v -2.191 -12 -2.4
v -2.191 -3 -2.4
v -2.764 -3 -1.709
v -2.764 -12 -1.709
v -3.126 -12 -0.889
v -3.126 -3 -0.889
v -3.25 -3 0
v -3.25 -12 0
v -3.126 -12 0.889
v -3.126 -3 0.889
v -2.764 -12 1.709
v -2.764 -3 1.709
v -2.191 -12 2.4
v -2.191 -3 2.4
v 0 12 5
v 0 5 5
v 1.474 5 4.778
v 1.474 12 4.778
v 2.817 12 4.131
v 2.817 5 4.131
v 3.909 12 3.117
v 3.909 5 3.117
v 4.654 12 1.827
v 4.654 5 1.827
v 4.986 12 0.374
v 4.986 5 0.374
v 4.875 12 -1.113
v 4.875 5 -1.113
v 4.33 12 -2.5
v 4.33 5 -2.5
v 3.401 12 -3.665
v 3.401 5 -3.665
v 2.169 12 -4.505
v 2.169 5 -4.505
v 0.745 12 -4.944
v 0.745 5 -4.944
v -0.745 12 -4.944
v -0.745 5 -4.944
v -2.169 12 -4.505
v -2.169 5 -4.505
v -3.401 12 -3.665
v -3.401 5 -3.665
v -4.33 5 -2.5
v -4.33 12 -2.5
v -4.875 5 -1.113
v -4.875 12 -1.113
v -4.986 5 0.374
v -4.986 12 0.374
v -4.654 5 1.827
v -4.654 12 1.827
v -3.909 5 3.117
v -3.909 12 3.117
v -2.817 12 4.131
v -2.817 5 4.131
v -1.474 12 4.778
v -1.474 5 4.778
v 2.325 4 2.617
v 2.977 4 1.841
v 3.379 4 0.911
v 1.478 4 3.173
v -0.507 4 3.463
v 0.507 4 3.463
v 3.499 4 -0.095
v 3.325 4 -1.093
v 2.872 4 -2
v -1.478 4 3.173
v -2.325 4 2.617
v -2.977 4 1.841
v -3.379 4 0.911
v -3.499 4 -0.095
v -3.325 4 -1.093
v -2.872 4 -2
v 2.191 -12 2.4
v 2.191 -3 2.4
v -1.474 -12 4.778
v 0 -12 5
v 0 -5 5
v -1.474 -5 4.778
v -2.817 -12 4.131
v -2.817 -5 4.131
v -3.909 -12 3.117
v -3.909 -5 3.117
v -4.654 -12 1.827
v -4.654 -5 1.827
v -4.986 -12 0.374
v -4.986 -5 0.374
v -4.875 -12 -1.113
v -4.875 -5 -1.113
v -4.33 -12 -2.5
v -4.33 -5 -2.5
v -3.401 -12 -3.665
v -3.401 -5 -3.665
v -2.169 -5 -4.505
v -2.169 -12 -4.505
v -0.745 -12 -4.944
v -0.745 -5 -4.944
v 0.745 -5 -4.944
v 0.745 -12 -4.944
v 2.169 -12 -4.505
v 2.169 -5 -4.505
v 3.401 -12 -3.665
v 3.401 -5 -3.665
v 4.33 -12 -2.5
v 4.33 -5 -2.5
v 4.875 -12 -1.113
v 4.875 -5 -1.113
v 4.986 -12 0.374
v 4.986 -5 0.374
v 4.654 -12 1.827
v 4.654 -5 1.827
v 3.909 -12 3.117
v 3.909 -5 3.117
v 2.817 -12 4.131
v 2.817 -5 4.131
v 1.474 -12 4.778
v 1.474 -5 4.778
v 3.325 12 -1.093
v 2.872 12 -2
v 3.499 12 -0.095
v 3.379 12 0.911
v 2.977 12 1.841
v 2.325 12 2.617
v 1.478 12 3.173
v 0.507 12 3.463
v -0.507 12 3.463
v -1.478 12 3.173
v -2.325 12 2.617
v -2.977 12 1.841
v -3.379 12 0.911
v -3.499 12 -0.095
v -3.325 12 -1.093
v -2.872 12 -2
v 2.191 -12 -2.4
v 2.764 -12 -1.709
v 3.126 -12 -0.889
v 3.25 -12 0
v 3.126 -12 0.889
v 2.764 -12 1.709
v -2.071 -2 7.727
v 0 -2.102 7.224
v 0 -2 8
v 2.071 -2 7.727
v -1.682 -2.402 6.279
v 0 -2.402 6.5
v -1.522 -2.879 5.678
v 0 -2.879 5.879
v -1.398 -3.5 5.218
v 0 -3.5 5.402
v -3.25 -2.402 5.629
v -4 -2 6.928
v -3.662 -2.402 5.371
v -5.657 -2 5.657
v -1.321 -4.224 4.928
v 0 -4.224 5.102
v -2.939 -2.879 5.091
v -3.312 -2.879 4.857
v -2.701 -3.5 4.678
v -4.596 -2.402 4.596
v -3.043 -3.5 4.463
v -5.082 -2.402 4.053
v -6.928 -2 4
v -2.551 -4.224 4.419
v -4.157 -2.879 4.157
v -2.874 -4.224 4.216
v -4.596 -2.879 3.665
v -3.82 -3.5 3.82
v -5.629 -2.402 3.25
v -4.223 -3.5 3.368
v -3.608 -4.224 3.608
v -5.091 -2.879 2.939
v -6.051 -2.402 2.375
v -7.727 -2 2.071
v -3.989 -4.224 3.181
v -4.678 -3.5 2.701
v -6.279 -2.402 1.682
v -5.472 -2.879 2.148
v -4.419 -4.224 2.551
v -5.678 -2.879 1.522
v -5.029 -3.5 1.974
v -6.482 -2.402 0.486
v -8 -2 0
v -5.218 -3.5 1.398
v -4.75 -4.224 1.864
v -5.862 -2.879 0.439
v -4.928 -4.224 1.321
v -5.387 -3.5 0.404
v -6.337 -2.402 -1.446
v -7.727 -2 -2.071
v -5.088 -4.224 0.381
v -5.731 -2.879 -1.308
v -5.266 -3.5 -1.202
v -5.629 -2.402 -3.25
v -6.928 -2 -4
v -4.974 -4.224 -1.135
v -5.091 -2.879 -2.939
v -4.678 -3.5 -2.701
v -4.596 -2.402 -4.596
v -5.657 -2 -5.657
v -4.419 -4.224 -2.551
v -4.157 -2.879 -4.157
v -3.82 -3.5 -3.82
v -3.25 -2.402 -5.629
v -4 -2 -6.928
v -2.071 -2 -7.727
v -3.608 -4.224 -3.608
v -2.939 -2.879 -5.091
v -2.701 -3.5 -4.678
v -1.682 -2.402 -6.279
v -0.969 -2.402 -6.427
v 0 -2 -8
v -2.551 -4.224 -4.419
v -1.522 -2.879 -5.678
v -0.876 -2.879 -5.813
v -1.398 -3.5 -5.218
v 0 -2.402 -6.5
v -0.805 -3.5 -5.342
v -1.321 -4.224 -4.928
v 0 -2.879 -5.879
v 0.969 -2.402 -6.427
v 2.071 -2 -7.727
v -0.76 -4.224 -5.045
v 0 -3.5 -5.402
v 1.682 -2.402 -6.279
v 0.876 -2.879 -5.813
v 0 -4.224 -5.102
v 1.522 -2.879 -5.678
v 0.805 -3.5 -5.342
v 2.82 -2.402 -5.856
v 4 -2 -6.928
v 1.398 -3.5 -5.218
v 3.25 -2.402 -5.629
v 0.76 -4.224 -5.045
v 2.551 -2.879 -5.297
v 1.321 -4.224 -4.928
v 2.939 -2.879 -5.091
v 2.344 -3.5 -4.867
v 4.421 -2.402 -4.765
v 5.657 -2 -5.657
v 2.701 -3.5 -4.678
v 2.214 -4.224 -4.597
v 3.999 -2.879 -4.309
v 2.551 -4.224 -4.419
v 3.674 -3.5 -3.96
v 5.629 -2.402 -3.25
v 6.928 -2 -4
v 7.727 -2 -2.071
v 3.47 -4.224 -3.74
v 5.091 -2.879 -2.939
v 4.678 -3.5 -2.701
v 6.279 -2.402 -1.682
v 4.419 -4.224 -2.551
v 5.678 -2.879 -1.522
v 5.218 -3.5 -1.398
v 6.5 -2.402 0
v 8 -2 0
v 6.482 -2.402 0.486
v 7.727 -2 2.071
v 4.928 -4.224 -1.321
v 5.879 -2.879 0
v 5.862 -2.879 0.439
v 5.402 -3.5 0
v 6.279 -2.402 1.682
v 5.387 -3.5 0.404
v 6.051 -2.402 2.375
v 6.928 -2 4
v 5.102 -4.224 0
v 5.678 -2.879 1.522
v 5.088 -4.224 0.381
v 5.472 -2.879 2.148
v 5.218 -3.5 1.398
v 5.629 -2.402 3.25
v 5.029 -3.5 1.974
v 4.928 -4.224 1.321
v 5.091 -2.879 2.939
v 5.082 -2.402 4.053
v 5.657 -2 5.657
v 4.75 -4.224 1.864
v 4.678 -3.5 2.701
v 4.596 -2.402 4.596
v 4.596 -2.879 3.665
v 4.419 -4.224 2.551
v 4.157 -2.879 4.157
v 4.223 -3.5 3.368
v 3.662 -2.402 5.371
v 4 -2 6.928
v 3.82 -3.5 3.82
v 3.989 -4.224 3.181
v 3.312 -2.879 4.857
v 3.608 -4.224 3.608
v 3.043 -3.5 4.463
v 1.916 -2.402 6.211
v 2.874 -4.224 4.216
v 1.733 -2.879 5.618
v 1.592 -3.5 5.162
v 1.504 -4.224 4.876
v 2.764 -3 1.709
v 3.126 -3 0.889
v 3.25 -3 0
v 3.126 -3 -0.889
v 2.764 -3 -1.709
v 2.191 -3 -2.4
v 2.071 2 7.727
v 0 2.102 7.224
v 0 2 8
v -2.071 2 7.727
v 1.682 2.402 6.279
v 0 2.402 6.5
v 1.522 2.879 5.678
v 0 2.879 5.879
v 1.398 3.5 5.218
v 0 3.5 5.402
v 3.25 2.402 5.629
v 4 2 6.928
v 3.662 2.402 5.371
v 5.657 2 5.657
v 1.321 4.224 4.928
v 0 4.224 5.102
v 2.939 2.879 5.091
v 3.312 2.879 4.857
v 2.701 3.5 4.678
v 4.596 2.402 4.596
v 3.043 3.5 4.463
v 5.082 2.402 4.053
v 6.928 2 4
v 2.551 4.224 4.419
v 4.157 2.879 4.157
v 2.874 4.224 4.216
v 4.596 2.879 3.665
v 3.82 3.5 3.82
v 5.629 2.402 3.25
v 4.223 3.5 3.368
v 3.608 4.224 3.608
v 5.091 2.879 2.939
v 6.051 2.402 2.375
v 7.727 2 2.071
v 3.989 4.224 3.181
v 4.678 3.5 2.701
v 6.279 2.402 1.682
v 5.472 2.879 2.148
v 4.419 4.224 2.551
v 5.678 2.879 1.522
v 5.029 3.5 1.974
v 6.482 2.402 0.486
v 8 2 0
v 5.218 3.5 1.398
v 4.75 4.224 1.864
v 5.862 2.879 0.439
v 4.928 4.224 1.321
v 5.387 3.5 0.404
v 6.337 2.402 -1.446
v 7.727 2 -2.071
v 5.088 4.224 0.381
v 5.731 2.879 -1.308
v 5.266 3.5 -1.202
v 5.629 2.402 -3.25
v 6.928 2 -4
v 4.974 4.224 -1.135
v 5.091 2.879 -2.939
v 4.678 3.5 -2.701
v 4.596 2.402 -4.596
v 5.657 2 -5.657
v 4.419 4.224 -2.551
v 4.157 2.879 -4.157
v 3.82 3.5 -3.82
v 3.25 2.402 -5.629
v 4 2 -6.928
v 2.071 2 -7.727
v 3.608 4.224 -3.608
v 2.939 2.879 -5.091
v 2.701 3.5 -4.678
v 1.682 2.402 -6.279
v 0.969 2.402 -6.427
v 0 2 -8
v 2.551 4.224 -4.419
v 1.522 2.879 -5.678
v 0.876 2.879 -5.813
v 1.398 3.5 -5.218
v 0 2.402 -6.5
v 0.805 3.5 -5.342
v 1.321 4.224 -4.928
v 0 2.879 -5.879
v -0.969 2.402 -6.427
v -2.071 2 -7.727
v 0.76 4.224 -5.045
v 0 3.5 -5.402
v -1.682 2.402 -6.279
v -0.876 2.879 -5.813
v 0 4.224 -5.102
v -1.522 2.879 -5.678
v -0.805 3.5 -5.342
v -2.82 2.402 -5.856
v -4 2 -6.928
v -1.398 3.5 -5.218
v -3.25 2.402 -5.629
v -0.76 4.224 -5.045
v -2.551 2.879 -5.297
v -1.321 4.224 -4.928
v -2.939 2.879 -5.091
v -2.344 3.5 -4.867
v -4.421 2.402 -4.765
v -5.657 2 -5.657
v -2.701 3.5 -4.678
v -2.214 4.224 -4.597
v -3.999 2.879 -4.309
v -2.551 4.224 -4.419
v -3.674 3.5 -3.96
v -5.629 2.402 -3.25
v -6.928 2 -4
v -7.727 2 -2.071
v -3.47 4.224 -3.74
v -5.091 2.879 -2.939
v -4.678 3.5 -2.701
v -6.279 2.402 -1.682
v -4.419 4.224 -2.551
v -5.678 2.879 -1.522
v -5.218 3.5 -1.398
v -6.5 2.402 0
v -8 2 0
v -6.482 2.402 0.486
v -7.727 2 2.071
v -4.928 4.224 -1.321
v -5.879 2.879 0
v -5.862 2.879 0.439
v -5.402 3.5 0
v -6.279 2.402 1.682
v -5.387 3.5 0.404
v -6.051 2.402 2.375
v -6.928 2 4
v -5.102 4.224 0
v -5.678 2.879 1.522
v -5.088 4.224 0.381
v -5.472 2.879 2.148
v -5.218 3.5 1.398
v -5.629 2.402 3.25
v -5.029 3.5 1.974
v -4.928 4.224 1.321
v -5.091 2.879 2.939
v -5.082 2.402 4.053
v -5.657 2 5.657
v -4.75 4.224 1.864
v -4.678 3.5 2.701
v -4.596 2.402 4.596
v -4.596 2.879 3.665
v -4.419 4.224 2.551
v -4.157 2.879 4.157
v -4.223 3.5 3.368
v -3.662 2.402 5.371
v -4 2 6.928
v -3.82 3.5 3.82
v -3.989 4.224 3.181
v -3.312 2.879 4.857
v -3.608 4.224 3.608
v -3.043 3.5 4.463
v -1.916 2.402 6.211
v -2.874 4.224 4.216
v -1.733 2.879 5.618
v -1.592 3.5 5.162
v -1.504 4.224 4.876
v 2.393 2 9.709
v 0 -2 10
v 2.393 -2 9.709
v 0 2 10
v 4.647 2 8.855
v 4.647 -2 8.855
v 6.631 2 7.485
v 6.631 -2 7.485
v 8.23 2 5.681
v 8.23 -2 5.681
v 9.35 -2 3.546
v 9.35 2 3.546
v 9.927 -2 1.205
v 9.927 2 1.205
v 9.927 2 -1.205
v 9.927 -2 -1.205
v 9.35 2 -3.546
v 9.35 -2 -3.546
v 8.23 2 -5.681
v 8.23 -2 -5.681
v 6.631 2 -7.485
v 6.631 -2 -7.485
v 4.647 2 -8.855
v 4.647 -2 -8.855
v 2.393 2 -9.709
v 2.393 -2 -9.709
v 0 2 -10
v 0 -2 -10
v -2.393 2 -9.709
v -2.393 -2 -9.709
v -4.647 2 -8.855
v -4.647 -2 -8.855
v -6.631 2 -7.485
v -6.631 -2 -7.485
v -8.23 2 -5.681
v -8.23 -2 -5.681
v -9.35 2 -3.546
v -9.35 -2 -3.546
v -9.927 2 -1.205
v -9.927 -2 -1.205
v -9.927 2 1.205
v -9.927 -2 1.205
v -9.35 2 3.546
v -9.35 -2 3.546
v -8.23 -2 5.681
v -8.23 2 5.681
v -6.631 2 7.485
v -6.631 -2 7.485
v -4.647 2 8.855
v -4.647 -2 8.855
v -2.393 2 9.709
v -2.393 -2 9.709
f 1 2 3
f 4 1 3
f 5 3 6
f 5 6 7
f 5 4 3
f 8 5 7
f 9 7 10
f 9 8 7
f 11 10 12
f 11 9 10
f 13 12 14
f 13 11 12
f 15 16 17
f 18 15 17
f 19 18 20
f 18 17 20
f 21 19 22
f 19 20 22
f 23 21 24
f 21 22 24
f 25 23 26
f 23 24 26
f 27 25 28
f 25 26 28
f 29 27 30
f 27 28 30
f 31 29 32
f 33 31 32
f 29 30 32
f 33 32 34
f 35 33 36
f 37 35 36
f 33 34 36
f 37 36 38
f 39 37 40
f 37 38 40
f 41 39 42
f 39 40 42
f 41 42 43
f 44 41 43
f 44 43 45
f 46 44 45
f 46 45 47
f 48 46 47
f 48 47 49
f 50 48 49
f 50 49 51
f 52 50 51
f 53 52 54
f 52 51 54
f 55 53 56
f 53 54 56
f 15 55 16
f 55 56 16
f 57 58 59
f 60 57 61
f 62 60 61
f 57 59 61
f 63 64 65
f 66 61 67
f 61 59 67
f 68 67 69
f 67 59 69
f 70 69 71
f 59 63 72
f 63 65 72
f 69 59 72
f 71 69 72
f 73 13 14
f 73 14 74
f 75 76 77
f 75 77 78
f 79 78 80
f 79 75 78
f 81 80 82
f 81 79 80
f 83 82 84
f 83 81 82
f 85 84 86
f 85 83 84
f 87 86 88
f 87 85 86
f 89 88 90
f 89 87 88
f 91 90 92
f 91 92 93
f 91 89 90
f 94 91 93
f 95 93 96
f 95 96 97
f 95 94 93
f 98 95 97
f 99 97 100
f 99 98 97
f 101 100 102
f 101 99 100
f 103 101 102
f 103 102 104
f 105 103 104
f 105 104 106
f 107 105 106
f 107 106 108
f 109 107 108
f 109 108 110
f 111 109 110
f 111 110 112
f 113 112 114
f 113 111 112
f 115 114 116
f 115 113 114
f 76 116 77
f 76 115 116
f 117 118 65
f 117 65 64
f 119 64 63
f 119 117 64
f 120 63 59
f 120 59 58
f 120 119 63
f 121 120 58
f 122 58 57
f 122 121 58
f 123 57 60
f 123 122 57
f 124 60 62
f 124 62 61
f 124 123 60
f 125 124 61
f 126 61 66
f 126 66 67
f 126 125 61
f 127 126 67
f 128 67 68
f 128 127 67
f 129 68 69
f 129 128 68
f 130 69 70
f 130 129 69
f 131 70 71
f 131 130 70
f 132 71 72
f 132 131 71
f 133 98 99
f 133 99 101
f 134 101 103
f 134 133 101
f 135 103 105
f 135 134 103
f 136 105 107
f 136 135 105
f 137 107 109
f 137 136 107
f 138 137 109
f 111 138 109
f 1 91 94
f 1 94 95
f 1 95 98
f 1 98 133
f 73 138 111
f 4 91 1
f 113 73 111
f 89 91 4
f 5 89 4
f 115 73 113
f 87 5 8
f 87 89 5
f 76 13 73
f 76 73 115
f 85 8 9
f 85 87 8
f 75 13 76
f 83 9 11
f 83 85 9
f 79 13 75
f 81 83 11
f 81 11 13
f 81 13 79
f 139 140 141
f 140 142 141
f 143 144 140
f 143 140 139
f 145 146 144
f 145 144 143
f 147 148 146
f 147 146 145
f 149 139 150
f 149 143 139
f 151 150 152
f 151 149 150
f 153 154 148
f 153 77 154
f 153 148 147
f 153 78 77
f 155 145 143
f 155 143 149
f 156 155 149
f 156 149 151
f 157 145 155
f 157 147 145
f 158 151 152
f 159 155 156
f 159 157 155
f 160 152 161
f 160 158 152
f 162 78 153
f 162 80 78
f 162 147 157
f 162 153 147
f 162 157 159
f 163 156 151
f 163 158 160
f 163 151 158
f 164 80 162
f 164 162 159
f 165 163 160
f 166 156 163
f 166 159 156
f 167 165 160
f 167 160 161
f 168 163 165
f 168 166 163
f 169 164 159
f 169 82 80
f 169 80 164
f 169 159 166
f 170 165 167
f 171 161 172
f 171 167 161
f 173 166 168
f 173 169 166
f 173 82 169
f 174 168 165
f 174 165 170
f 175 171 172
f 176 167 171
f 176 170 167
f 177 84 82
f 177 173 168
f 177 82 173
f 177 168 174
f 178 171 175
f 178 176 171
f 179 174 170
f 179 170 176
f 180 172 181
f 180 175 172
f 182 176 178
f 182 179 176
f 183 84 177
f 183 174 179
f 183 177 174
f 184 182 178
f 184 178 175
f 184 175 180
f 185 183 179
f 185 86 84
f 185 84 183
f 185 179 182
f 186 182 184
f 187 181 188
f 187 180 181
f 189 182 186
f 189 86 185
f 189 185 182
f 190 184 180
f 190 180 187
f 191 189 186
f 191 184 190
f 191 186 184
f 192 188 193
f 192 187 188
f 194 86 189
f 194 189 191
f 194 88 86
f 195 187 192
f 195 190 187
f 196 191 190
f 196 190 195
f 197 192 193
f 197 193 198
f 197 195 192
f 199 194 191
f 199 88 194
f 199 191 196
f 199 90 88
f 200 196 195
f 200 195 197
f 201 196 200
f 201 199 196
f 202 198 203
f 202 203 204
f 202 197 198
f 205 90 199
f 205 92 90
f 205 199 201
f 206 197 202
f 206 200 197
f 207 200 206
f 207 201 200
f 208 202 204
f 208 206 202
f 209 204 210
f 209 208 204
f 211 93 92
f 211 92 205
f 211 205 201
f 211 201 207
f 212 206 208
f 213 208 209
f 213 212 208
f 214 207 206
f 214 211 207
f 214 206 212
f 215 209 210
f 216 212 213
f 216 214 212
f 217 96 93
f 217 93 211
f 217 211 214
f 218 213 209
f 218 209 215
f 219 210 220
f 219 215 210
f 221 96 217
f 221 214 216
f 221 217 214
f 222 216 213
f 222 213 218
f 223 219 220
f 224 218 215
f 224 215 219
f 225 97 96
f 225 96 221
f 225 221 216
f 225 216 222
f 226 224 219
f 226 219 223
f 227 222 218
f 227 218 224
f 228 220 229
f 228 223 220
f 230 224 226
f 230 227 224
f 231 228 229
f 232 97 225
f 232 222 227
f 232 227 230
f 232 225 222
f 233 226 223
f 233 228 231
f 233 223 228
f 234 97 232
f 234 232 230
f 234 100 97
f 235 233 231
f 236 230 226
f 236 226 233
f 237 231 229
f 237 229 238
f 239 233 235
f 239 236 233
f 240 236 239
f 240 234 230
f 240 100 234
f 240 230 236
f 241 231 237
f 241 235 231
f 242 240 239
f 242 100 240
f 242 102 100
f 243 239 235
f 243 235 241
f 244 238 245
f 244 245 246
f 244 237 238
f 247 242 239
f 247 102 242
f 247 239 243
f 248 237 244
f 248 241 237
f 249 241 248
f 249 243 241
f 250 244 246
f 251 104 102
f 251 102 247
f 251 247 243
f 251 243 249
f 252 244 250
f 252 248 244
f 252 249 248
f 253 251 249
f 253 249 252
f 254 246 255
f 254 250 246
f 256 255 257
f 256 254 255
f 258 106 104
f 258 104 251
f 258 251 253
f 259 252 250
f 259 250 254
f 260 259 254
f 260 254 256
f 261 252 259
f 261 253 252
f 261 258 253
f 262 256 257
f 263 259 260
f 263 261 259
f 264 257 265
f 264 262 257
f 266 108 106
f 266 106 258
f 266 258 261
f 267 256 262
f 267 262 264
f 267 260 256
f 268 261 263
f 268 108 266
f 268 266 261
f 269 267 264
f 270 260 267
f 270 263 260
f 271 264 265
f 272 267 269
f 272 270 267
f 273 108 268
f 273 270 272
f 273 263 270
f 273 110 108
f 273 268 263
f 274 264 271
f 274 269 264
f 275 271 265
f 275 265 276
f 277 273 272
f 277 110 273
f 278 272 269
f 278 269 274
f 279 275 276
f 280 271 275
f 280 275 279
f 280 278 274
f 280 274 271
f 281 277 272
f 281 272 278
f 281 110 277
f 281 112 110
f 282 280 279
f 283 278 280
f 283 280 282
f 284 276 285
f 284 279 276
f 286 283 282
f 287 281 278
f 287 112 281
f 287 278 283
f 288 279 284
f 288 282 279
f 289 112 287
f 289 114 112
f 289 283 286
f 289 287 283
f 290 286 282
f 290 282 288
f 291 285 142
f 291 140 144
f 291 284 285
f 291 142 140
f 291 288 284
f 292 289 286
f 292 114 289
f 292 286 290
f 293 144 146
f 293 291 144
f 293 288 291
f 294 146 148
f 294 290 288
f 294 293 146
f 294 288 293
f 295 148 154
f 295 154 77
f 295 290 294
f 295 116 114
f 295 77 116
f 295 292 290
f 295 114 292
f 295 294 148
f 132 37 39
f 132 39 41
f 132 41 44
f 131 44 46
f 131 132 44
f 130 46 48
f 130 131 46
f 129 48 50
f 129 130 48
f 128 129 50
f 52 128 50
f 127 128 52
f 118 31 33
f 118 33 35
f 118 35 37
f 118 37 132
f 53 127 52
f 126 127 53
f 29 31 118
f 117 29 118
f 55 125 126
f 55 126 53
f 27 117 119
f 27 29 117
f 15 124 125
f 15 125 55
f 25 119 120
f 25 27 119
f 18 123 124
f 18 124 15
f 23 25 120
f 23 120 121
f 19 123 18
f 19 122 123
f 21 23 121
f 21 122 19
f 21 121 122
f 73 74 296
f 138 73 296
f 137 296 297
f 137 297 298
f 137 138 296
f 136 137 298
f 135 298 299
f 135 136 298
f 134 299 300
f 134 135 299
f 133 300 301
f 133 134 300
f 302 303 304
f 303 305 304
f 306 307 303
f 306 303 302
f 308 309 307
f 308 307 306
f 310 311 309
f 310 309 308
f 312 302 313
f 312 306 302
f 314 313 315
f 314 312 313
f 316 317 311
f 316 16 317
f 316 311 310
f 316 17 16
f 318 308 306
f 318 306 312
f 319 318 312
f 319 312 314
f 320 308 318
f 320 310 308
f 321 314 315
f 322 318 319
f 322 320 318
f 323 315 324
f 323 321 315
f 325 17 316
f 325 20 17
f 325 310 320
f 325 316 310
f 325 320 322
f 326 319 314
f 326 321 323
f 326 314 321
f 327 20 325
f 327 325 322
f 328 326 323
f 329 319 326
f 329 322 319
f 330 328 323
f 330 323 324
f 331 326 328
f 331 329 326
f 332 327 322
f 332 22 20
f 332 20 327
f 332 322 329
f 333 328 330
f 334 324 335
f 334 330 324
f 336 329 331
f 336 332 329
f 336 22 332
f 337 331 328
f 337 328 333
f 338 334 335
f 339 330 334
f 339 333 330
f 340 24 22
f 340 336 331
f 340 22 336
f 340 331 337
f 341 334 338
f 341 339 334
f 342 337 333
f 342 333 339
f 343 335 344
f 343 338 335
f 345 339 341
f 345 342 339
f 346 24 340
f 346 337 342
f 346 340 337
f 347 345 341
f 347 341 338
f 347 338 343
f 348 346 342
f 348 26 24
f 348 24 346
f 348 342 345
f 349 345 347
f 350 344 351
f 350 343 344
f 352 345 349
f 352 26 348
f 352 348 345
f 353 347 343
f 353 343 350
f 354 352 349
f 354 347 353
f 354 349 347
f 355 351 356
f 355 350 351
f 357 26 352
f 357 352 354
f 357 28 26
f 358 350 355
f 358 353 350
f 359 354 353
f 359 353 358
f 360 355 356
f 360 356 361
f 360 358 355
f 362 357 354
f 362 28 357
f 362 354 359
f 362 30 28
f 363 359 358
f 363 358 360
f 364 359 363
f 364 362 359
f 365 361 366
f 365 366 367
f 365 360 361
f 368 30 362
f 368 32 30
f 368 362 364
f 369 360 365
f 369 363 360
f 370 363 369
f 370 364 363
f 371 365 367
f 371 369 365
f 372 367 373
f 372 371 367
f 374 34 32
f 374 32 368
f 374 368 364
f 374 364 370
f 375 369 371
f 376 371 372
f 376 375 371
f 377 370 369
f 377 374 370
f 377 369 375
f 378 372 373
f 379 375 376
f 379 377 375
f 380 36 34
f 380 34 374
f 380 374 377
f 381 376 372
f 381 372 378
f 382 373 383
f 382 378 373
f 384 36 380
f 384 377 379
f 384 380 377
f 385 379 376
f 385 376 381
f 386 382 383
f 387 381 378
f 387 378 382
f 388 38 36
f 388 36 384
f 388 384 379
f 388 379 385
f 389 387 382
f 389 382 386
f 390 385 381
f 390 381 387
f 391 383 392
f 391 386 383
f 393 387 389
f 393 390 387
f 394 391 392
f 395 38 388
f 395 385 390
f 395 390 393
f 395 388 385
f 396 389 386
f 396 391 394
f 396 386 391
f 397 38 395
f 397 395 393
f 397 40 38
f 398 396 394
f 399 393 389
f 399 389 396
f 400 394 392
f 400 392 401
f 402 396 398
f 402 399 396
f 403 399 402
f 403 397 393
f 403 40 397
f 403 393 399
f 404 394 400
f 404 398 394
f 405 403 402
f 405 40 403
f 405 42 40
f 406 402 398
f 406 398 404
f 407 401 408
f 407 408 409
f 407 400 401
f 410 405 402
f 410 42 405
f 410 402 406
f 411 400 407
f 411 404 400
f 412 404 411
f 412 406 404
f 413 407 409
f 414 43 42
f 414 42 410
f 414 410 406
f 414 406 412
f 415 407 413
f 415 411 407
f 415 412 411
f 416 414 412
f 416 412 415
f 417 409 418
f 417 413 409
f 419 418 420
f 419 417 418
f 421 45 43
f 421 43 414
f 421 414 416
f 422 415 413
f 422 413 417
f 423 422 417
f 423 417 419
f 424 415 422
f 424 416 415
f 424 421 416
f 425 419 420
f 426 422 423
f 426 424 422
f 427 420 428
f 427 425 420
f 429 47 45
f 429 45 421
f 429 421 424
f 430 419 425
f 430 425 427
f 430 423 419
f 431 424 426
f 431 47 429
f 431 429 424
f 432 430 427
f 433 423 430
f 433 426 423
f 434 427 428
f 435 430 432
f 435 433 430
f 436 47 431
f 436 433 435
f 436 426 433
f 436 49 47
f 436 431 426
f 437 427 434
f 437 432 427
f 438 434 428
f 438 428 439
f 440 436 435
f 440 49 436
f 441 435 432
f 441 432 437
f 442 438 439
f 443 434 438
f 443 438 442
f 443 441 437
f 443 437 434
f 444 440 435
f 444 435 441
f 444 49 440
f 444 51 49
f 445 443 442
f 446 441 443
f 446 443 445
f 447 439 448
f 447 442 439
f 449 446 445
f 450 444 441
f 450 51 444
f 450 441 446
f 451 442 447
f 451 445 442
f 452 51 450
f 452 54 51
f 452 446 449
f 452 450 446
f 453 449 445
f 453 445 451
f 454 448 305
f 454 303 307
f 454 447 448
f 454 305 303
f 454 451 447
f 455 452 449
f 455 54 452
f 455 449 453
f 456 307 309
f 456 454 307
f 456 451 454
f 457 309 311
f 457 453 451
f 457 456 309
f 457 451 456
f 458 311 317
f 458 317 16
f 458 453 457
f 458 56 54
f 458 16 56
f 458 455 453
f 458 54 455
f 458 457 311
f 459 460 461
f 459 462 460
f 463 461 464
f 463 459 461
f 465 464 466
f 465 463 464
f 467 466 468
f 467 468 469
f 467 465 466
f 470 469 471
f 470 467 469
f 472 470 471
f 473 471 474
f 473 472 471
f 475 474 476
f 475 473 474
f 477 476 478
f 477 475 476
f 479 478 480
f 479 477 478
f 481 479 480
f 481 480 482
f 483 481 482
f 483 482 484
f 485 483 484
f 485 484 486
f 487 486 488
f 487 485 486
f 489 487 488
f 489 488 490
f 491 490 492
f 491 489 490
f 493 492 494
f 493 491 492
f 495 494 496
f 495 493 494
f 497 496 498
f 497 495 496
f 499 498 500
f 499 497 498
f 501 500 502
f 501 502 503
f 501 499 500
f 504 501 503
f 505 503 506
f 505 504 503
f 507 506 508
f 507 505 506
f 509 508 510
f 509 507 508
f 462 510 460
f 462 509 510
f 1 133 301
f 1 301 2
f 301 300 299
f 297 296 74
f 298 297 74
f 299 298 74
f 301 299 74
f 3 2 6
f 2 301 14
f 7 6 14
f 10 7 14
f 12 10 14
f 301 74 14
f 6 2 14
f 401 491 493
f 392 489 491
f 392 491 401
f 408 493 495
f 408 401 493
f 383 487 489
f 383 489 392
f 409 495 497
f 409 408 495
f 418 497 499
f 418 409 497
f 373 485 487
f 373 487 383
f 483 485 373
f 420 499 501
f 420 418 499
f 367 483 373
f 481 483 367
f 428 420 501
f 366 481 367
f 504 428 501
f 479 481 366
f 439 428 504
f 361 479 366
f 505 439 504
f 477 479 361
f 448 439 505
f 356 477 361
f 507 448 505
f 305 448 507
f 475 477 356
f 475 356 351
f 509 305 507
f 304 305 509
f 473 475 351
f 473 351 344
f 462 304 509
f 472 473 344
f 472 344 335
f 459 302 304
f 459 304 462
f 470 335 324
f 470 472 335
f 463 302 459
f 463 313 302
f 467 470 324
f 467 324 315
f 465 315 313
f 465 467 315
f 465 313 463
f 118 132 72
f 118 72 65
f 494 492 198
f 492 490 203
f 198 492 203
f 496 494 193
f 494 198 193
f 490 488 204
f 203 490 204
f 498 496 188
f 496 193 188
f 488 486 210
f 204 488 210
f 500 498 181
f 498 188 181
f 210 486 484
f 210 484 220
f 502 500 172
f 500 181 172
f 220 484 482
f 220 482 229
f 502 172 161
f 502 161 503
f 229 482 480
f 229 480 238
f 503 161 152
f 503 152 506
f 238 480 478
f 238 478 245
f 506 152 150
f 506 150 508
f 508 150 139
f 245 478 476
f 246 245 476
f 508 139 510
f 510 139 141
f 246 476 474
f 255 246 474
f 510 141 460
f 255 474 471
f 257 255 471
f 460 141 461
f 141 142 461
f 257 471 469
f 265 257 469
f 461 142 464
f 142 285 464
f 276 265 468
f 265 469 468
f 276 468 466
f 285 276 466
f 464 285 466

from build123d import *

# Parameters (mm, degrees)
CROQUIS1_R              = 10
SALIENTE_EXTRUIR1_DEPTH = 2
CROQUIS2_R              = 5
SALIENTE_EXTRUIR2_DEPTH = 10
CORTAR_EXTRUIR1_DEPTH   = 8
SALIENTE_EXTRUIR3_START = 10
CROQUIS4_R              = 5
SALIENTE_EXTRUIR3_DEPTH = 10
REDONDEO1_R             = 3
CORTAR_EXTRUIR2_DEPTH   = 9


with BuildPart() as part:
    # Croquis1 → Saliente-Extruir1 (new, symmetric)
    with BuildSketch(Plane(origin=(0, 0, 0), x_dir=(1, 0, 0), z_dir=(0, 1, 0))):
        with Locations(Location((0, 0, 0), (0, 0, 270))):
            Circle(CROQUIS1_R)
    extrude(amount=SALIENTE_EXTRUIR1_DEPTH, both=True)

    # Croquis2 → Saliente-Extruir2 (add)
    with BuildSketch(Plane(origin=(0, 2, 0), x_dir=(1, 0, 0), z_dir=(0, 1, 0))):
        with Locations(Location((0, 0, 0), (0, 0, 270))):
            Circle(CROQUIS2_R)
    extrude(amount=SALIENTE_EXTRUIR2_DEPTH)

    # Croquis3 → Cortar-Extruir1 (cut)
    with BuildSketch(Plane(origin=(0, 12, 0), x_dir=(1, 0, 0), z_dir=(0, 1, 0))):
        with BuildLine():
            Line((-2.872281323, 2), (2.872281323, 2))
            ThreePointArc((2.872281323, 2), (0, -3.5), (-2.872281323, 2))
        make_face()
    extrude(amount=-CORTAR_EXTRUIR1_DEPTH, mode=Mode.SUBTRACT)

    # Croquis4 → Saliente-Extruir3 (add)
    with BuildSketch(Plane(origin=(0, -2, 0), x_dir=(-1, 0, 0), z_dir=(0, -1, 0)).offset(SALIENTE_EXTRUIR3_START)):
        with Locations(Location((0, 0, 0), (0, 0, 270))):
            Circle(CROQUIS4_R)
    extrude(amount=-SALIENTE_EXTRUIR3_DEPTH)

    # Redondeo1
    redondeo1_edges = [part.edges().sort_by_distance(p)[0] for p in [
        (0, -2, -5),
        (0, 2, -5),
    ]]
    fillet(redondeo1_edges, radius=REDONDEO1_R)

    # Croquis5 → Cortar-Extruir2 (cut)
    with BuildSketch(Plane.XZ.offset(12)):
        with BuildLine():
            Line((-2.1914607, 2.4), (2.1914607, 2.4))
            ThreePointArc((2.1914607, 2.4), (3.25, 0), (2.1914607, -2.4))
            Line((2.1914607, -2.4), (-2.1914607, -2.4))
            ThreePointArc((-2.1914607, -2.4), (-3.25, 0), (-2.1914607, 2.4))
        make_face()
    extrude(amount=-CORTAR_EXTRUIR2_DEPTH, mode=Mode.SUBTRACT)


solid = part.part
